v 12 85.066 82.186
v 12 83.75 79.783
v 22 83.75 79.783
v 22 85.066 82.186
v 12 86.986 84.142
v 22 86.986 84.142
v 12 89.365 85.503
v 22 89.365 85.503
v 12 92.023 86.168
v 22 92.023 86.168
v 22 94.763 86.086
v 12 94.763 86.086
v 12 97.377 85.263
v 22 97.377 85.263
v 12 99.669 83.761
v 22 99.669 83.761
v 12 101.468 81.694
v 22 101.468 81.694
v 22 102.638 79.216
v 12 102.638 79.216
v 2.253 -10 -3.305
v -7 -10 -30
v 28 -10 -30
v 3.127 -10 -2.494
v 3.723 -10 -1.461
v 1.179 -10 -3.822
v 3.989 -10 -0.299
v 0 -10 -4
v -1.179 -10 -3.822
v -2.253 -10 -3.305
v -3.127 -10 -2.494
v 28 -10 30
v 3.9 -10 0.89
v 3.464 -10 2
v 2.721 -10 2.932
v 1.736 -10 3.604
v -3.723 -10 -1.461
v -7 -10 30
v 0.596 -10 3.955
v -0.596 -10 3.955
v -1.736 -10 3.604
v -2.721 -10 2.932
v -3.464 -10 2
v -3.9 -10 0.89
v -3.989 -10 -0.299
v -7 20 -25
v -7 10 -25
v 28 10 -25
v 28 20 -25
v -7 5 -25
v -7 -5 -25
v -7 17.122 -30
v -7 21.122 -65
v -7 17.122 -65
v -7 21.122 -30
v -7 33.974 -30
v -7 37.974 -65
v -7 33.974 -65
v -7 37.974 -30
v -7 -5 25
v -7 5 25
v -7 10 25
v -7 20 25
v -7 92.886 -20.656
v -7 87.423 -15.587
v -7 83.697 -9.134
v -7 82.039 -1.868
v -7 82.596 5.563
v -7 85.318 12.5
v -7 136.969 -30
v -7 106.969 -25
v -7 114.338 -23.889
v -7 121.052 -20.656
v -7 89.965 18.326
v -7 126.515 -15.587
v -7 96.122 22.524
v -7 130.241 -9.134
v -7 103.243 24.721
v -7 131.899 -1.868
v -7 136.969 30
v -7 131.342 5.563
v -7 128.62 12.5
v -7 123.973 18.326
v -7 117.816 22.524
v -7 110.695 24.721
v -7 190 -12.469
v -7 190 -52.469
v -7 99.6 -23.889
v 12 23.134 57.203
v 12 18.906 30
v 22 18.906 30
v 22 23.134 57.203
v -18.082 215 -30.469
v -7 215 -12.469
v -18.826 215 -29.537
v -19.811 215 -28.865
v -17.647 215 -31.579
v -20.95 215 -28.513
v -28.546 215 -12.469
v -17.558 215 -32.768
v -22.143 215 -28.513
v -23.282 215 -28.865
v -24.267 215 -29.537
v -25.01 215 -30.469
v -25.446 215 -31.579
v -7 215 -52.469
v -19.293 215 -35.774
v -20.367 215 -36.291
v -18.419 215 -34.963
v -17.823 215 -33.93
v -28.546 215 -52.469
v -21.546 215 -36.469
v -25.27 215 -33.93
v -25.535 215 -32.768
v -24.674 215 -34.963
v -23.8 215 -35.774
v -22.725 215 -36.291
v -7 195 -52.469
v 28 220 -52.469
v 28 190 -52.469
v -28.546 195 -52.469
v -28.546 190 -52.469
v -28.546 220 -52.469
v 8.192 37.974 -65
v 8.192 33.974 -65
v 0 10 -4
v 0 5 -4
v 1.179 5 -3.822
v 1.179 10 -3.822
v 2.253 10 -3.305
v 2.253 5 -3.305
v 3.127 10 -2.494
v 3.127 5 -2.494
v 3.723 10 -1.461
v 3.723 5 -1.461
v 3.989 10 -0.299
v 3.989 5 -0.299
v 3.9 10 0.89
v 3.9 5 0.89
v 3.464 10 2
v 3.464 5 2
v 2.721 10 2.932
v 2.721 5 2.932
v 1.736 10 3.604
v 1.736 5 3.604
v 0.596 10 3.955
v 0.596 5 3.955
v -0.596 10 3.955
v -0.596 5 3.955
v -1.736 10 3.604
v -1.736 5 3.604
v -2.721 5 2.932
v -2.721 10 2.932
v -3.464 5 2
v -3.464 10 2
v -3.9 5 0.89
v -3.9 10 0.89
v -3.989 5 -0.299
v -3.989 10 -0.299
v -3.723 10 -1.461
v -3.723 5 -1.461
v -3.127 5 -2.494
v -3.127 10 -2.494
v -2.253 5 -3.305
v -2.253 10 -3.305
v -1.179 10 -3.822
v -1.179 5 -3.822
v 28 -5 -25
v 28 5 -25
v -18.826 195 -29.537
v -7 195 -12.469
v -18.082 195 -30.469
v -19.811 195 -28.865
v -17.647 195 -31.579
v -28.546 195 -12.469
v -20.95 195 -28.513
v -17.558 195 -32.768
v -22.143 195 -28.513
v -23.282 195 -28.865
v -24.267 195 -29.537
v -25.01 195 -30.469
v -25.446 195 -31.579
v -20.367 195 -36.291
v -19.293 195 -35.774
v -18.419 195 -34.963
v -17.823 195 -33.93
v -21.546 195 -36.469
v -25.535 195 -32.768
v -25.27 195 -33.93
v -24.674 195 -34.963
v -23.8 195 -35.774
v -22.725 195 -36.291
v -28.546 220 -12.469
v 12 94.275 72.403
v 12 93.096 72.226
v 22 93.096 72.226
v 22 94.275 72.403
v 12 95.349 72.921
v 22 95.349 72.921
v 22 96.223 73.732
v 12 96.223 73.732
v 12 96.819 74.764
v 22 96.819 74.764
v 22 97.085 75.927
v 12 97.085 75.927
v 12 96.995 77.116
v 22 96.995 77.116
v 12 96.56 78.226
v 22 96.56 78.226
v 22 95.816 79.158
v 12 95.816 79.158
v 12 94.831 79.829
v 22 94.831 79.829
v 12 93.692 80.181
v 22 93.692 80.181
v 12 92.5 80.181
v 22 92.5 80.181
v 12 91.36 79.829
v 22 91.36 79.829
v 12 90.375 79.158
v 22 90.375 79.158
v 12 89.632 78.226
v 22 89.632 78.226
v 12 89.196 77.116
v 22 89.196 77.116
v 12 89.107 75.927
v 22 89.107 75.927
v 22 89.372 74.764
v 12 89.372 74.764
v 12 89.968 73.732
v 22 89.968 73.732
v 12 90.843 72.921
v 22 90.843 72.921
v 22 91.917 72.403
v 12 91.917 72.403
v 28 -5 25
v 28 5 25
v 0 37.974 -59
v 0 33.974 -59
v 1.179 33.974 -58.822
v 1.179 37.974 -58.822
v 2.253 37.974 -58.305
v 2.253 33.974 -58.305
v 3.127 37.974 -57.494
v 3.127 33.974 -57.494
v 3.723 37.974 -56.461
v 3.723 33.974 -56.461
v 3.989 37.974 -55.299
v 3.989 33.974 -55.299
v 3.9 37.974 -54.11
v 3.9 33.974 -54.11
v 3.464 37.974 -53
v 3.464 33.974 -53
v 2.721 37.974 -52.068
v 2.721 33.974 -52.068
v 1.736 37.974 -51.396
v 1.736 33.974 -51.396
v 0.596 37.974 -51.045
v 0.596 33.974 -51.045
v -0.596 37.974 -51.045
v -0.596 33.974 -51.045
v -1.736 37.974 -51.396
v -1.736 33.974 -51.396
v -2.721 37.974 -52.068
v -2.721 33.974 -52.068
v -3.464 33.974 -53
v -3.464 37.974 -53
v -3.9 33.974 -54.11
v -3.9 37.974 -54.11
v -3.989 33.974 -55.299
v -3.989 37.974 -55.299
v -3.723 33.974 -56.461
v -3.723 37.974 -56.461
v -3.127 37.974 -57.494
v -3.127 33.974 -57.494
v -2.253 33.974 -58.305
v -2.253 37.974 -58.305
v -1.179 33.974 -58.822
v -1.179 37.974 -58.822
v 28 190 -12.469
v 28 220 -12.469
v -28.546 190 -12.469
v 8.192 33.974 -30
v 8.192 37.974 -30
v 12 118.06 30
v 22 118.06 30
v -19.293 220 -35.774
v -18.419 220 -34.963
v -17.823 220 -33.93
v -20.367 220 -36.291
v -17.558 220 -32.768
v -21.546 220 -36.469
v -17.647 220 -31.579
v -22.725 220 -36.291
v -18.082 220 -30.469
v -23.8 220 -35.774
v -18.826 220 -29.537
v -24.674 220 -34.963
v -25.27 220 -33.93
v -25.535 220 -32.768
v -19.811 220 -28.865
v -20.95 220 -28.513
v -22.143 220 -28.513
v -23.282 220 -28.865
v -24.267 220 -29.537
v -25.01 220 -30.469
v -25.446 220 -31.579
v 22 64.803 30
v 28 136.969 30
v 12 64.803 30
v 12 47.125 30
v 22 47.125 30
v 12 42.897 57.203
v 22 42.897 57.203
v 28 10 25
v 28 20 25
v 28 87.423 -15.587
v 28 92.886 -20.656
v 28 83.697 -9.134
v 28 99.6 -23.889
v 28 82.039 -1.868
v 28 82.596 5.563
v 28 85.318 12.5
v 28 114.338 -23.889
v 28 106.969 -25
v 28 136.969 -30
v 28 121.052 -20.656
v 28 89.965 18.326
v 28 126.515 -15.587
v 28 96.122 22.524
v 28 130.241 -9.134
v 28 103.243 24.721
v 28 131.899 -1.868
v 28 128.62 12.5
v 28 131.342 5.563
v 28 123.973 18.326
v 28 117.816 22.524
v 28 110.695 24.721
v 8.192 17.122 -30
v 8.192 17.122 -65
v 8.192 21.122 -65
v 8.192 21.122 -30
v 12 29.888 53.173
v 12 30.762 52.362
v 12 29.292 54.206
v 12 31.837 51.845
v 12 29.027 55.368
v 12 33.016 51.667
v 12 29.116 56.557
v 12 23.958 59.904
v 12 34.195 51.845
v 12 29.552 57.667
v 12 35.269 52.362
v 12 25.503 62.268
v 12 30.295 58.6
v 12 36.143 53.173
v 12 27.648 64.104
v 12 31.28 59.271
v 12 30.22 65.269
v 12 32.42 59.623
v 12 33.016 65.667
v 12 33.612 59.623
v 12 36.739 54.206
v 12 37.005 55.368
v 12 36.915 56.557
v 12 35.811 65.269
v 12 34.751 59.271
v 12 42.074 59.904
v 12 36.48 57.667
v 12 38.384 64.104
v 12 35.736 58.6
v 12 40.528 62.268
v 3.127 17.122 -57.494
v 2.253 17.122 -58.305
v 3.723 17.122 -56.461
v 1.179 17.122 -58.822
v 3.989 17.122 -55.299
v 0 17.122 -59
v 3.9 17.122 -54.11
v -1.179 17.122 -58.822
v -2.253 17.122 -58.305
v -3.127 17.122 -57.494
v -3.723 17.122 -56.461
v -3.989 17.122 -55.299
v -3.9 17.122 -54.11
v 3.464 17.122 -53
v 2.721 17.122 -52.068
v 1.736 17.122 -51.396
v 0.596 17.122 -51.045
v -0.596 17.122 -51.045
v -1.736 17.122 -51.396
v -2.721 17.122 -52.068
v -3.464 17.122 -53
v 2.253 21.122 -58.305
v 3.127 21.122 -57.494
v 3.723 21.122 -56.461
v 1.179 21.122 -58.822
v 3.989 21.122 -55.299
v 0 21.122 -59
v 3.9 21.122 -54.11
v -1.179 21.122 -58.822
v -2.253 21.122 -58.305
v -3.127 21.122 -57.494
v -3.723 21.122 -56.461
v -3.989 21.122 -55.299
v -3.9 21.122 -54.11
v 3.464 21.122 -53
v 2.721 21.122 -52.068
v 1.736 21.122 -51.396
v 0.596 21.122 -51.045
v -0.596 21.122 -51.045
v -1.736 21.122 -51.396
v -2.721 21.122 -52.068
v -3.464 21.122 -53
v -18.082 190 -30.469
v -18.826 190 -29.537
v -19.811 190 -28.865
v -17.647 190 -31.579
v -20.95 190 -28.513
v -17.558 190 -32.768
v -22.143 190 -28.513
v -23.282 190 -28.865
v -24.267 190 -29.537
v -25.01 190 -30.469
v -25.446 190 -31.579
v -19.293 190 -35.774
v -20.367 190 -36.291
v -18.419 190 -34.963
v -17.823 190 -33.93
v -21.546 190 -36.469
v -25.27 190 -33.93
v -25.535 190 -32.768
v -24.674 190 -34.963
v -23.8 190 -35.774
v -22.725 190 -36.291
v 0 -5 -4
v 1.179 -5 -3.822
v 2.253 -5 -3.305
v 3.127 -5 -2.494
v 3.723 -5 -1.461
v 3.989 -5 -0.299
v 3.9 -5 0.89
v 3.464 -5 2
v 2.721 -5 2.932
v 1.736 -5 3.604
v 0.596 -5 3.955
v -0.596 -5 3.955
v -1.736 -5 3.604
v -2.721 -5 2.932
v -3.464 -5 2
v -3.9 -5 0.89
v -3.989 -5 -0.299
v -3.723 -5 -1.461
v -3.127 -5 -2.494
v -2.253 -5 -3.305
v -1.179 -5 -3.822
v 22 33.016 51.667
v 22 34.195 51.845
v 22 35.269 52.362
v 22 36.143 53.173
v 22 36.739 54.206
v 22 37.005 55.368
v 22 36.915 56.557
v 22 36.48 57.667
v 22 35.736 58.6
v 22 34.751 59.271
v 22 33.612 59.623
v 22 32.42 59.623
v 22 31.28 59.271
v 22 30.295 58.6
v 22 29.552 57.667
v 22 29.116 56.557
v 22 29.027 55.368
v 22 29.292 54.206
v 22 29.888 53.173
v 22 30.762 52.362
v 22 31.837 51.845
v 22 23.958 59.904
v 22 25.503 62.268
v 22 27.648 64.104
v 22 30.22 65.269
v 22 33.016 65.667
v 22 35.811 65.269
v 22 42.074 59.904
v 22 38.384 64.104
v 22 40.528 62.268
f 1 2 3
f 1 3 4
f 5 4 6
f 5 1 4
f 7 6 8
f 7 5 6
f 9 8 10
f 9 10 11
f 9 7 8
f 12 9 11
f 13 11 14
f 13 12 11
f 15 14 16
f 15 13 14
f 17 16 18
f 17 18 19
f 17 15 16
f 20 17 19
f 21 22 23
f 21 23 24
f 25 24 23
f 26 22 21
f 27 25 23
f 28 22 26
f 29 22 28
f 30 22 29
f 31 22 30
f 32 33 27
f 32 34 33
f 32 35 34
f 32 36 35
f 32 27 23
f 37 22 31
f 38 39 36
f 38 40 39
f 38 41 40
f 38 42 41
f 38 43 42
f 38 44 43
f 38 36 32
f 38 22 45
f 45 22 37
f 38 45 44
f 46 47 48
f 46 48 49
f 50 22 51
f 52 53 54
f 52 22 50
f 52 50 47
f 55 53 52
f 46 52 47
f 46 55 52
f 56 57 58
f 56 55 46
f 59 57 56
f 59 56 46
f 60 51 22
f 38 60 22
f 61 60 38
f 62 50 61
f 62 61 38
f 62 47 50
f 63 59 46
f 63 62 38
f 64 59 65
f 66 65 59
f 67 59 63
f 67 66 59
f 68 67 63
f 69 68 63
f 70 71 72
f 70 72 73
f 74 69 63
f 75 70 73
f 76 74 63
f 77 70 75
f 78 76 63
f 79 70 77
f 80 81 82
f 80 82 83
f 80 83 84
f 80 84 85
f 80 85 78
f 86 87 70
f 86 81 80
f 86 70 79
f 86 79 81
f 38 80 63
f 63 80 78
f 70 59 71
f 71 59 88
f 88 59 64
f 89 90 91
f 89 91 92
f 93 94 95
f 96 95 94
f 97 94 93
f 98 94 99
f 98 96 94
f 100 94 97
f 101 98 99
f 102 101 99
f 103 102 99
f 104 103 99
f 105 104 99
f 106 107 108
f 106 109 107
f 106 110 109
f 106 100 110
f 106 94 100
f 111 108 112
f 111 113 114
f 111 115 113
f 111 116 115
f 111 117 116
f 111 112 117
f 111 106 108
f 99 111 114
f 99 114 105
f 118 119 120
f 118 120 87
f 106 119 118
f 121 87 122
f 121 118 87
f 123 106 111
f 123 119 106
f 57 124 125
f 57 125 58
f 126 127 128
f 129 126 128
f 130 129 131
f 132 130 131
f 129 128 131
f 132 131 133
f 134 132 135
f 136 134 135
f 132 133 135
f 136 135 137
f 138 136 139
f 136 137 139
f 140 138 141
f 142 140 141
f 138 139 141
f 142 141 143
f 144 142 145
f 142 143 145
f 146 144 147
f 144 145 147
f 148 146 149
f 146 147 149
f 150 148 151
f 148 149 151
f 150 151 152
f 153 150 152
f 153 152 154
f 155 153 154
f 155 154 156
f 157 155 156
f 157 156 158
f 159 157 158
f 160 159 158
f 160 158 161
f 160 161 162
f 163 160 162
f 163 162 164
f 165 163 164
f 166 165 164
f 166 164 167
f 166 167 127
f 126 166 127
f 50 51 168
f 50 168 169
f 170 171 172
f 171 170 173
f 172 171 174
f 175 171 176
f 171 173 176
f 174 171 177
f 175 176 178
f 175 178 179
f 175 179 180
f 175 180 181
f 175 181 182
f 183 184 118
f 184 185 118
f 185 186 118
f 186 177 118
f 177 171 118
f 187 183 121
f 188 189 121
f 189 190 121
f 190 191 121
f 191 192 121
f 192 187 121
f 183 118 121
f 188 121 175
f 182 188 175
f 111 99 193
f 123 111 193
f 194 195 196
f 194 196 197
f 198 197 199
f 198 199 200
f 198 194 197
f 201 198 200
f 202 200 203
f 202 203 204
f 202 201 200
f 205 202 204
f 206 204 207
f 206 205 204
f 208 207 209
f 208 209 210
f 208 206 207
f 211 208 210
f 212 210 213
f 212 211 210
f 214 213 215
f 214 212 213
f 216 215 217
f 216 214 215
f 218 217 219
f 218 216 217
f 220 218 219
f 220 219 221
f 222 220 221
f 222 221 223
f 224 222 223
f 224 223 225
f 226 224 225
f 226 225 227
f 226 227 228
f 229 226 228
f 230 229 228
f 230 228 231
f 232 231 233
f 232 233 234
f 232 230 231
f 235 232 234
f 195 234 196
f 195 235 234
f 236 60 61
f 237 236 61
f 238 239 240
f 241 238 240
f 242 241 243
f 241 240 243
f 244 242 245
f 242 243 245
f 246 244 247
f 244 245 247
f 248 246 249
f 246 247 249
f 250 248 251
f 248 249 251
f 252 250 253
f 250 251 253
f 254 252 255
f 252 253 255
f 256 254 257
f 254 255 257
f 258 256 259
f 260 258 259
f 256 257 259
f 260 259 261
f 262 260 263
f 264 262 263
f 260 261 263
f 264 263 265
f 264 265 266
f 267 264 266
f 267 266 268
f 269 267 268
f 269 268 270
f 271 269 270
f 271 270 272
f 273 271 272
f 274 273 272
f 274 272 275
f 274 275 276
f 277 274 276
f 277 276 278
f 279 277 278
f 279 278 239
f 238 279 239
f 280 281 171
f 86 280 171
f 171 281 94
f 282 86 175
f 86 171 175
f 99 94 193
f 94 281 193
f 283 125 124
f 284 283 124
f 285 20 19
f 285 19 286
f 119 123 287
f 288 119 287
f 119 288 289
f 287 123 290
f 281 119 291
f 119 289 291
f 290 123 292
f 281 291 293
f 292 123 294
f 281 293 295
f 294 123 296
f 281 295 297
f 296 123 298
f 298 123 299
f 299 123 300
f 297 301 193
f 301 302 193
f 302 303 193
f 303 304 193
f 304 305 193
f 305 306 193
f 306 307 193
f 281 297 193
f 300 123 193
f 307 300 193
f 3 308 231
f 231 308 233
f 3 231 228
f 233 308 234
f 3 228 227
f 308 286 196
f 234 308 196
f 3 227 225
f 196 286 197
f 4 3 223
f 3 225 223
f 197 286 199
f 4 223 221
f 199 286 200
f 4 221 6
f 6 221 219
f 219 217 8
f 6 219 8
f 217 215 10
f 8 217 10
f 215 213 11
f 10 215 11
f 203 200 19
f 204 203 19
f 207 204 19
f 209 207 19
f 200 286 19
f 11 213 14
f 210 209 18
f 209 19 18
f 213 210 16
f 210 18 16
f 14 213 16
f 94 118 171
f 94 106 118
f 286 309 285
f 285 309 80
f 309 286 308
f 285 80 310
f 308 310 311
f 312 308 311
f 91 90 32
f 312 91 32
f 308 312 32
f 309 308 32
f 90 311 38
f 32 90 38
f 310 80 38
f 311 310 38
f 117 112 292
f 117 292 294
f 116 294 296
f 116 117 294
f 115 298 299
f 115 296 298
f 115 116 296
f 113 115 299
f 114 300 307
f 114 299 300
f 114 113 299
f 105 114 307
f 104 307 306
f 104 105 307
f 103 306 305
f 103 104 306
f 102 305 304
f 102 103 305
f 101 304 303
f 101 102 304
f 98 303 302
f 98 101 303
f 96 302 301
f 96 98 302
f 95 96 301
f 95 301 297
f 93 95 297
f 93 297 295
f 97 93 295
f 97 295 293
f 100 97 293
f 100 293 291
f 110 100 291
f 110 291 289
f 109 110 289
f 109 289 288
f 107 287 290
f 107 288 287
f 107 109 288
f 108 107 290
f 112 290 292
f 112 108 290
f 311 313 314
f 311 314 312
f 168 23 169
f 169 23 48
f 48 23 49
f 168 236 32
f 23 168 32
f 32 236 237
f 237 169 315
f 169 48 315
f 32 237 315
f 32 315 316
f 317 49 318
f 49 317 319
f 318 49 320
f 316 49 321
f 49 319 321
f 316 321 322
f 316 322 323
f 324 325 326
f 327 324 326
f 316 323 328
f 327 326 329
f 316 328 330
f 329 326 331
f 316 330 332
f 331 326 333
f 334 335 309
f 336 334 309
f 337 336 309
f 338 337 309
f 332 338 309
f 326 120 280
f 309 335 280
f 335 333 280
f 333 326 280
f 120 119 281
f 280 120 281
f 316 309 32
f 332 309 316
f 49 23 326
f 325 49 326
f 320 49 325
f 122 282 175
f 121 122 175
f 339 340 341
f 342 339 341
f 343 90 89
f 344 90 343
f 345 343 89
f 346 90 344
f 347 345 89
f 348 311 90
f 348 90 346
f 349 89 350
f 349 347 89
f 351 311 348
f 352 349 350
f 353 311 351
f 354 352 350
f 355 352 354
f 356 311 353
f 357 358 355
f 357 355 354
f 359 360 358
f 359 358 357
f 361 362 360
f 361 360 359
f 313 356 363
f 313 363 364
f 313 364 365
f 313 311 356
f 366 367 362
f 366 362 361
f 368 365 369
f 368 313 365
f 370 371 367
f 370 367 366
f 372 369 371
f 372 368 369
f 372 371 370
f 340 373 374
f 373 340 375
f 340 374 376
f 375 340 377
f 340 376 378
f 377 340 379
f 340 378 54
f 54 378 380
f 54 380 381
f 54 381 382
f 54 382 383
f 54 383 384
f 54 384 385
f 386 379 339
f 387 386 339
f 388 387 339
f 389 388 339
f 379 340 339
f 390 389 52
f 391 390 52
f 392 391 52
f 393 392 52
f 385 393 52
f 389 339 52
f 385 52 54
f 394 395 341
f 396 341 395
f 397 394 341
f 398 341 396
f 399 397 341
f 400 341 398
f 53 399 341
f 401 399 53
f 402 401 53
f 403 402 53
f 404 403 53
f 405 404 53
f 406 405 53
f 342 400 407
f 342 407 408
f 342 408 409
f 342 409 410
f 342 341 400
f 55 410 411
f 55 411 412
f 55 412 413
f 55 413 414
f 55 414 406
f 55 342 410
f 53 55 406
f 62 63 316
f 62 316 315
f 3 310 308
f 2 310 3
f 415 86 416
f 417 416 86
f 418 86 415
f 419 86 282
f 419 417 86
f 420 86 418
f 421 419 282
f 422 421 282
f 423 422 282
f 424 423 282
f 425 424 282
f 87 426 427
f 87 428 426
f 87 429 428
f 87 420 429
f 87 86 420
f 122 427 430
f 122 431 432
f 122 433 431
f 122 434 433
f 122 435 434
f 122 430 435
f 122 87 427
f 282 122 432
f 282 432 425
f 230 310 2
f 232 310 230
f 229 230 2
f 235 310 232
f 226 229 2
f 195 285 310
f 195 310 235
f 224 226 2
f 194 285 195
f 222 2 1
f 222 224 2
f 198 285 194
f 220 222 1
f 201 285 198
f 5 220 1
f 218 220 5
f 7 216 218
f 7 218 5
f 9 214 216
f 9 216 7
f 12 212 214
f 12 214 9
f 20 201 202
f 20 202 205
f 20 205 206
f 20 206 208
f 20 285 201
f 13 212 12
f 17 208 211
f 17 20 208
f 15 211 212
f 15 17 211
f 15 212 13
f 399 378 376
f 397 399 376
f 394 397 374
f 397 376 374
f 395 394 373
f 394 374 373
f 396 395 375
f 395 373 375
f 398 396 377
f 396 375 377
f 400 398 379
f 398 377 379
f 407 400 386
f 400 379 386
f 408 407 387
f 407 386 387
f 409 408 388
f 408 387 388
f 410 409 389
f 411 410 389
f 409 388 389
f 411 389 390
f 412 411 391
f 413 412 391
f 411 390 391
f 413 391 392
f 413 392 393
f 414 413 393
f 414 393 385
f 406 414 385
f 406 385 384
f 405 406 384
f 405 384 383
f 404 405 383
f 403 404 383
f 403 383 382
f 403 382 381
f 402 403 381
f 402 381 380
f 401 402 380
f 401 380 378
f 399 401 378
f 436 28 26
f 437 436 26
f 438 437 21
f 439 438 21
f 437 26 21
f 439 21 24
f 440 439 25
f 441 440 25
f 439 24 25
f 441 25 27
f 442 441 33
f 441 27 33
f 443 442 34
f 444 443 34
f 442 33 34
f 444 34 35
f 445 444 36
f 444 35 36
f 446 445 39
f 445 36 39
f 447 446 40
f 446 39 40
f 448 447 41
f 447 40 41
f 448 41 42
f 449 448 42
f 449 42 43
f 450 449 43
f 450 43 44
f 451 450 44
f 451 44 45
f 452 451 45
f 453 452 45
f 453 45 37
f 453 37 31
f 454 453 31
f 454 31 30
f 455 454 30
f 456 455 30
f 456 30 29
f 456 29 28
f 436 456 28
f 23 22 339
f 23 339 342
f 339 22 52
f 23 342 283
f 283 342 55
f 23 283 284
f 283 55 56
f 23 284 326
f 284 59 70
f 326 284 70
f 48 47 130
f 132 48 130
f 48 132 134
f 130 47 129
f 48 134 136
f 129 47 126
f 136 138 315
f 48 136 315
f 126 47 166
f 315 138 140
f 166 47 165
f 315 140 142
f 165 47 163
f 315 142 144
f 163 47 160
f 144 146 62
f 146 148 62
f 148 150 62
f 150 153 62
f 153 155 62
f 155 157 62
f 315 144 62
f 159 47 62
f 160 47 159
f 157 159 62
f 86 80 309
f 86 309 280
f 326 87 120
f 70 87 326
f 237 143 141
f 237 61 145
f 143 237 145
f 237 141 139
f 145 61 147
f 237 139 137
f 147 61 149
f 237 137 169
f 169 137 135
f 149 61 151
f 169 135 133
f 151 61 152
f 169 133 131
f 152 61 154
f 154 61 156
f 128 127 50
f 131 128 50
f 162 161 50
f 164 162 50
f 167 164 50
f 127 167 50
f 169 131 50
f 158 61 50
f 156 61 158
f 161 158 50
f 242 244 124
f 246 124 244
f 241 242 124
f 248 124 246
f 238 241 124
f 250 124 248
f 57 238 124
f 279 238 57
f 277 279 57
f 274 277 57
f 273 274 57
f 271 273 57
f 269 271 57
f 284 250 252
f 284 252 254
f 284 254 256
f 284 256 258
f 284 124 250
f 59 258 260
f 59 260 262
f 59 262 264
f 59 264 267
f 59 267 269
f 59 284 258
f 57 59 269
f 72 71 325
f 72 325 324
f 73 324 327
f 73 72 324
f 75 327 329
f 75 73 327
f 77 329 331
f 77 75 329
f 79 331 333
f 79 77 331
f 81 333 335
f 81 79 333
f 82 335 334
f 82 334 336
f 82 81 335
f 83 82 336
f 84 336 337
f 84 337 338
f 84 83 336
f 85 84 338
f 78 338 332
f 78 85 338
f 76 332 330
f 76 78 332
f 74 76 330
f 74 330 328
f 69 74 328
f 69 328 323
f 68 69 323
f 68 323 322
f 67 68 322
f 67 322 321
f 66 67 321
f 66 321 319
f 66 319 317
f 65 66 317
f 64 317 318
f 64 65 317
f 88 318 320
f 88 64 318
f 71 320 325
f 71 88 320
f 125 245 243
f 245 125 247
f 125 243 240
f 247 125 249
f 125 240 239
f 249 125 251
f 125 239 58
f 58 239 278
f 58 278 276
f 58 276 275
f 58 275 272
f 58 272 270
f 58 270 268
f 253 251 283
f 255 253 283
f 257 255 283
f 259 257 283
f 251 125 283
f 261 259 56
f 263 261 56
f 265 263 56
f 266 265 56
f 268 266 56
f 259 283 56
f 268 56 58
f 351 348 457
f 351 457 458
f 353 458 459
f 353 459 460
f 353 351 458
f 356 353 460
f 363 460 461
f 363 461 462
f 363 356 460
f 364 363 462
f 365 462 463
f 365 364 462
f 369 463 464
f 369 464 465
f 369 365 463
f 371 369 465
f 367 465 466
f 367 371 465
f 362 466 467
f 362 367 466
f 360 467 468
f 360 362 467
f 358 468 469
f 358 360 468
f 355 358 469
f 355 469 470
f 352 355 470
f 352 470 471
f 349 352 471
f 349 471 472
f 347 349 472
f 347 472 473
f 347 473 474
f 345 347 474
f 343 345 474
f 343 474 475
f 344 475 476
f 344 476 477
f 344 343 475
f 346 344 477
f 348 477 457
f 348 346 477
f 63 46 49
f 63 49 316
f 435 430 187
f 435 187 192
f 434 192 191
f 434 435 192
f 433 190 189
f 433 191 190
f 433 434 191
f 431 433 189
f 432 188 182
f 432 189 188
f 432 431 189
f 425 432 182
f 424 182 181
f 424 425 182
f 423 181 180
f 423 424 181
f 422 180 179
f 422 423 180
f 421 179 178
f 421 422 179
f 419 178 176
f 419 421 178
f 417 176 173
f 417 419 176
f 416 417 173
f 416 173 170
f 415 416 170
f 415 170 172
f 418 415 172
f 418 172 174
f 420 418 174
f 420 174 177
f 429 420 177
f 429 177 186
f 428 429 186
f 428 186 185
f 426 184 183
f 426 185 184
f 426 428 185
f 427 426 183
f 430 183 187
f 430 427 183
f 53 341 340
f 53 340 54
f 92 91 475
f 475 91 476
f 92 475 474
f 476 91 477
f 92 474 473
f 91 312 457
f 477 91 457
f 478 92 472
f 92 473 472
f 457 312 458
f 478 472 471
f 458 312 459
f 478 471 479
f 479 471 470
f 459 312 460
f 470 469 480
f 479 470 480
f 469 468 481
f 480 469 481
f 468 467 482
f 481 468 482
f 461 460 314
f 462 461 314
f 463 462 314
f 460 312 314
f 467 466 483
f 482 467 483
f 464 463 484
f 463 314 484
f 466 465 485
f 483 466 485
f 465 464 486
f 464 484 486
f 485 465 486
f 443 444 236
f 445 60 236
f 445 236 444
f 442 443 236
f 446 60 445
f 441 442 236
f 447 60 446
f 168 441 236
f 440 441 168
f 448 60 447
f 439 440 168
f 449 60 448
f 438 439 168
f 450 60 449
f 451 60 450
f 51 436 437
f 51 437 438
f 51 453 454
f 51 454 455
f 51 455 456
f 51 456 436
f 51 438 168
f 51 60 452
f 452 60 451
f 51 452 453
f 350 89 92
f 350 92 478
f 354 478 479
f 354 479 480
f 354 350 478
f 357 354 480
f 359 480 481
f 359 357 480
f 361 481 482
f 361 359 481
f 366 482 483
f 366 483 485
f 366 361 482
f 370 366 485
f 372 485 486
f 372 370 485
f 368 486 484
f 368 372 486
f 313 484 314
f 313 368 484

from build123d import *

# Parameters (mm, degrees)
BOSS_EXTRUDE1_DEPTH      = 28
BOSS_EXTRUDE1_DEPTH_BACK = 7
SKETCH1_R                = 25
SKETCH1_W                = 50
SKETCH1_H                = 10
SKETCH3_W                = 21.546368229
SKETCH3_H                = 5
BOSS_EXTRUDE2_DEPTH      = 40
CUT_EXTRUDE1_DEPTH       = 238.629693409
CUT_EXTRUDE1_DEPTH_BACK  = 40
SKETCH4_R                = 4
SKETCH5_R                = 4
CUT_EXTRUDE2_DEPTH       = 25
SKETCH6_W                = 15.192054263
SKETCH6_H                = 4
BOSS_EXTRUDE4_DEPTH      = 35
SKETCH7_R                = 4
CUT_EXTRUDE3_DEPTH       = 35
BOSS_EXTRUDE5_DEPTH      = 5
BOSS_EXTRUDE5_DEPTH_BACK = 5
SKETCH8_R                = 4


with BuildPart() as part:
    # Sketch1 → Boss-Extrude1 (new, two sides: drawn at the far end of the back side and taken through both)
    # profile 1 of 3: a face of its own
    with BuildSketch(Plane(origin=(0, 0, 0), x_dir=(0, 0, -1), z_dir=(1, 0, 0)).offset(-BOSS_EXTRUDE1_DEPTH_BACK)):
        Polygon((12.468810267, 220), (12.468810267, 190), (52.468810267, 190), (52.468810267, 205), (52.468810267, 220), align=None)
    # profile 2 of 3: a face of its own
    with BuildSketch(Plane(origin=(0, 0, 0), x_dir=(0, 0, -1), z_dir=(1, 0, 0)).offset(-BOSS_EXTRUDE1_DEPTH_BACK)):
        Polygon((12.468810267, 190), (52.468810267, 190), (30, 136.969027383), (-30, 136.969027383), align=None)
    # profile 3 of 3: a face of its own
    with BuildSketch(Plane(origin=(0, 0, 0), x_dir=(0, 0, -1), z_dir=(1, 0, 0)).offset(-BOSS_EXTRUDE1_DEPTH_BACK)):
        Polygon((-30, 136.969027383), (30, 136.969027383), (30, 106.969027383), (30, 10), (30, -10), (-30, -10), (-30, 10), (-30, 106.969027383), align=None)
        with Locations((0, 106.969027383)):
            Circle(SKETCH1_R, mode=Mode.SUBTRACT)
        Polygon((-25, 20), (-25, 10), (0, 10), (25, 10), (25, 20), align=None, mode=Mode.SUBTRACT)
        Rectangle(SKETCH1_W, SKETCH1_H, mode=Mode.SUBTRACT)
    extrude(amount=BOSS_EXTRUDE1_DEPTH + BOSS_EXTRUDE1_DEPTH_BACK)

    # Sketch3 → Boss-Extrude2 (add)
    with BuildSketch(Plane(origin=(0, 0, -52.468810267), x_dir=(-1, 0, 0), z_dir=(0, 0, -1))):
        with Locations((17.773184115, 192.5)):
            Rectangle(SKETCH3_W, SKETCH3_H)
        with Locations((17.773184115, 217.5)):
            Rectangle(SKETCH3_W, SKETCH3_H)
    extrude(amount=-BOSS_EXTRUDE2_DEPTH)

    # Sketch4 → Cut-Extrude1 (cut, two sides: drawn at the far end of the back side and taken through both)
    with BuildSketch(Plane(origin=(0, 220, 0), x_dir=(1, 0, 0), z_dir=(0, 1, 0)).offset(-CUT_EXTRUDE1_DEPTH_BACK)):
        with Locations(Location((-21.546368229, 32.468810267, 0), (0, 0, 90))):
            Circle(SKETCH4_R)
    extrude(amount=CUT_EXTRUDE1_DEPTH + CUT_EXTRUDE1_DEPTH_BACK, mode=Mode.SUBTRACT)

    # Sketch5 → Cut-Extrude2 (cut)
    with BuildSketch(Plane.XZ.offset(10)):
        with Locations(Location((0, 0, 0), (0, 0, 270))):
            Circle(SKETCH5_R)
    extrude(amount=-CUT_EXTRUDE2_DEPTH, mode=Mode.SUBTRACT)

    # Sketch6 → Boss-Extrude4 (add)
    with BuildSketch(Plane(origin=(0, 0, -30), x_dir=(-1, 0, 0), z_dir=(0, 0, -1))):
        with Locations((-0.596027132, 35.974427815)):
            Rectangle(SKETCH6_W, SKETCH6_H)
        with Locations((-0.596027132, 19.121539986)):
            Rectangle(SKETCH6_W, SKETCH6_H)
    extrude(amount=BOSS_EXTRUDE4_DEPTH)

    # Sketch7 → Cut-Extrude3 (cut)
    with BuildSketch(Plane.XZ.offset(-17.121539986)):
        with Locations(Location((0, -55, 0), (0, 0, 270))):
            Circle(SKETCH7_R)
    extrude(amount=-CUT_EXTRUDE3_DEPTH, mode=Mode.SUBTRACT)

    # Sketch8 → Boss-Extrude5 (add, two sides: drawn at the far end of the back side and taken through both)
    # profile 1 of 2: a face of its own
    with BuildSketch(Plane(origin=(17, 0, 0), x_dir=(0, 0, -1), z_dir=(1, 0, 0)).offset(-BOSS_EXTRUDE5_DEPTH_BACK)):
        with BuildLine():
            Line((-30, 118.060328993), (-30, 64.802844314))
            Line((-30, 64.802844314), (-79.782583008, 83.7497926))
            ThreePointArc((-79.782583008, 83.7497926), (-86.221055725, 93.395743584), (-79.215750464, 102.638254039))
            Line((-79.215750464, 102.638254039), (-30, 118.060328993))
        make_face()
        with Locations((-76.225555525, 93.095784012)):
            Circle(SKETCH8_R, mode=Mode.SUBTRACT)
    # profile 2 of 2: a face of its own
    with BuildSketch(Plane(origin=(17, 0, 0), x_dir=(0, 0, -1), z_dir=(1, 0, 0)).offset(-BOSS_EXTRUDE5_DEPTH_BACK)):
        with BuildLine():
            Line((-30, 47.125470645), (-30, 18.906005285))
            Line((-30, 18.906005285), (-57.203314441, 23.134394747))
            ThreePointArc((-57.203314441, 23.134394747), (-65.667392499, 33.015737965), (-57.203314441, 42.897081183))
            Line((-57.203314441, 42.897081183), (-30, 47.125470645))
        make_face()
        with Locations((-55.667392499, 33.015737965)):
            Circle(SKETCH8_R, mode=Mode.SUBTRACT)
    extrude(amount=BOSS_EXTRUDE5_DEPTH + BOSS_EXTRUDE5_DEPTH_BACK)


solid = part.part
